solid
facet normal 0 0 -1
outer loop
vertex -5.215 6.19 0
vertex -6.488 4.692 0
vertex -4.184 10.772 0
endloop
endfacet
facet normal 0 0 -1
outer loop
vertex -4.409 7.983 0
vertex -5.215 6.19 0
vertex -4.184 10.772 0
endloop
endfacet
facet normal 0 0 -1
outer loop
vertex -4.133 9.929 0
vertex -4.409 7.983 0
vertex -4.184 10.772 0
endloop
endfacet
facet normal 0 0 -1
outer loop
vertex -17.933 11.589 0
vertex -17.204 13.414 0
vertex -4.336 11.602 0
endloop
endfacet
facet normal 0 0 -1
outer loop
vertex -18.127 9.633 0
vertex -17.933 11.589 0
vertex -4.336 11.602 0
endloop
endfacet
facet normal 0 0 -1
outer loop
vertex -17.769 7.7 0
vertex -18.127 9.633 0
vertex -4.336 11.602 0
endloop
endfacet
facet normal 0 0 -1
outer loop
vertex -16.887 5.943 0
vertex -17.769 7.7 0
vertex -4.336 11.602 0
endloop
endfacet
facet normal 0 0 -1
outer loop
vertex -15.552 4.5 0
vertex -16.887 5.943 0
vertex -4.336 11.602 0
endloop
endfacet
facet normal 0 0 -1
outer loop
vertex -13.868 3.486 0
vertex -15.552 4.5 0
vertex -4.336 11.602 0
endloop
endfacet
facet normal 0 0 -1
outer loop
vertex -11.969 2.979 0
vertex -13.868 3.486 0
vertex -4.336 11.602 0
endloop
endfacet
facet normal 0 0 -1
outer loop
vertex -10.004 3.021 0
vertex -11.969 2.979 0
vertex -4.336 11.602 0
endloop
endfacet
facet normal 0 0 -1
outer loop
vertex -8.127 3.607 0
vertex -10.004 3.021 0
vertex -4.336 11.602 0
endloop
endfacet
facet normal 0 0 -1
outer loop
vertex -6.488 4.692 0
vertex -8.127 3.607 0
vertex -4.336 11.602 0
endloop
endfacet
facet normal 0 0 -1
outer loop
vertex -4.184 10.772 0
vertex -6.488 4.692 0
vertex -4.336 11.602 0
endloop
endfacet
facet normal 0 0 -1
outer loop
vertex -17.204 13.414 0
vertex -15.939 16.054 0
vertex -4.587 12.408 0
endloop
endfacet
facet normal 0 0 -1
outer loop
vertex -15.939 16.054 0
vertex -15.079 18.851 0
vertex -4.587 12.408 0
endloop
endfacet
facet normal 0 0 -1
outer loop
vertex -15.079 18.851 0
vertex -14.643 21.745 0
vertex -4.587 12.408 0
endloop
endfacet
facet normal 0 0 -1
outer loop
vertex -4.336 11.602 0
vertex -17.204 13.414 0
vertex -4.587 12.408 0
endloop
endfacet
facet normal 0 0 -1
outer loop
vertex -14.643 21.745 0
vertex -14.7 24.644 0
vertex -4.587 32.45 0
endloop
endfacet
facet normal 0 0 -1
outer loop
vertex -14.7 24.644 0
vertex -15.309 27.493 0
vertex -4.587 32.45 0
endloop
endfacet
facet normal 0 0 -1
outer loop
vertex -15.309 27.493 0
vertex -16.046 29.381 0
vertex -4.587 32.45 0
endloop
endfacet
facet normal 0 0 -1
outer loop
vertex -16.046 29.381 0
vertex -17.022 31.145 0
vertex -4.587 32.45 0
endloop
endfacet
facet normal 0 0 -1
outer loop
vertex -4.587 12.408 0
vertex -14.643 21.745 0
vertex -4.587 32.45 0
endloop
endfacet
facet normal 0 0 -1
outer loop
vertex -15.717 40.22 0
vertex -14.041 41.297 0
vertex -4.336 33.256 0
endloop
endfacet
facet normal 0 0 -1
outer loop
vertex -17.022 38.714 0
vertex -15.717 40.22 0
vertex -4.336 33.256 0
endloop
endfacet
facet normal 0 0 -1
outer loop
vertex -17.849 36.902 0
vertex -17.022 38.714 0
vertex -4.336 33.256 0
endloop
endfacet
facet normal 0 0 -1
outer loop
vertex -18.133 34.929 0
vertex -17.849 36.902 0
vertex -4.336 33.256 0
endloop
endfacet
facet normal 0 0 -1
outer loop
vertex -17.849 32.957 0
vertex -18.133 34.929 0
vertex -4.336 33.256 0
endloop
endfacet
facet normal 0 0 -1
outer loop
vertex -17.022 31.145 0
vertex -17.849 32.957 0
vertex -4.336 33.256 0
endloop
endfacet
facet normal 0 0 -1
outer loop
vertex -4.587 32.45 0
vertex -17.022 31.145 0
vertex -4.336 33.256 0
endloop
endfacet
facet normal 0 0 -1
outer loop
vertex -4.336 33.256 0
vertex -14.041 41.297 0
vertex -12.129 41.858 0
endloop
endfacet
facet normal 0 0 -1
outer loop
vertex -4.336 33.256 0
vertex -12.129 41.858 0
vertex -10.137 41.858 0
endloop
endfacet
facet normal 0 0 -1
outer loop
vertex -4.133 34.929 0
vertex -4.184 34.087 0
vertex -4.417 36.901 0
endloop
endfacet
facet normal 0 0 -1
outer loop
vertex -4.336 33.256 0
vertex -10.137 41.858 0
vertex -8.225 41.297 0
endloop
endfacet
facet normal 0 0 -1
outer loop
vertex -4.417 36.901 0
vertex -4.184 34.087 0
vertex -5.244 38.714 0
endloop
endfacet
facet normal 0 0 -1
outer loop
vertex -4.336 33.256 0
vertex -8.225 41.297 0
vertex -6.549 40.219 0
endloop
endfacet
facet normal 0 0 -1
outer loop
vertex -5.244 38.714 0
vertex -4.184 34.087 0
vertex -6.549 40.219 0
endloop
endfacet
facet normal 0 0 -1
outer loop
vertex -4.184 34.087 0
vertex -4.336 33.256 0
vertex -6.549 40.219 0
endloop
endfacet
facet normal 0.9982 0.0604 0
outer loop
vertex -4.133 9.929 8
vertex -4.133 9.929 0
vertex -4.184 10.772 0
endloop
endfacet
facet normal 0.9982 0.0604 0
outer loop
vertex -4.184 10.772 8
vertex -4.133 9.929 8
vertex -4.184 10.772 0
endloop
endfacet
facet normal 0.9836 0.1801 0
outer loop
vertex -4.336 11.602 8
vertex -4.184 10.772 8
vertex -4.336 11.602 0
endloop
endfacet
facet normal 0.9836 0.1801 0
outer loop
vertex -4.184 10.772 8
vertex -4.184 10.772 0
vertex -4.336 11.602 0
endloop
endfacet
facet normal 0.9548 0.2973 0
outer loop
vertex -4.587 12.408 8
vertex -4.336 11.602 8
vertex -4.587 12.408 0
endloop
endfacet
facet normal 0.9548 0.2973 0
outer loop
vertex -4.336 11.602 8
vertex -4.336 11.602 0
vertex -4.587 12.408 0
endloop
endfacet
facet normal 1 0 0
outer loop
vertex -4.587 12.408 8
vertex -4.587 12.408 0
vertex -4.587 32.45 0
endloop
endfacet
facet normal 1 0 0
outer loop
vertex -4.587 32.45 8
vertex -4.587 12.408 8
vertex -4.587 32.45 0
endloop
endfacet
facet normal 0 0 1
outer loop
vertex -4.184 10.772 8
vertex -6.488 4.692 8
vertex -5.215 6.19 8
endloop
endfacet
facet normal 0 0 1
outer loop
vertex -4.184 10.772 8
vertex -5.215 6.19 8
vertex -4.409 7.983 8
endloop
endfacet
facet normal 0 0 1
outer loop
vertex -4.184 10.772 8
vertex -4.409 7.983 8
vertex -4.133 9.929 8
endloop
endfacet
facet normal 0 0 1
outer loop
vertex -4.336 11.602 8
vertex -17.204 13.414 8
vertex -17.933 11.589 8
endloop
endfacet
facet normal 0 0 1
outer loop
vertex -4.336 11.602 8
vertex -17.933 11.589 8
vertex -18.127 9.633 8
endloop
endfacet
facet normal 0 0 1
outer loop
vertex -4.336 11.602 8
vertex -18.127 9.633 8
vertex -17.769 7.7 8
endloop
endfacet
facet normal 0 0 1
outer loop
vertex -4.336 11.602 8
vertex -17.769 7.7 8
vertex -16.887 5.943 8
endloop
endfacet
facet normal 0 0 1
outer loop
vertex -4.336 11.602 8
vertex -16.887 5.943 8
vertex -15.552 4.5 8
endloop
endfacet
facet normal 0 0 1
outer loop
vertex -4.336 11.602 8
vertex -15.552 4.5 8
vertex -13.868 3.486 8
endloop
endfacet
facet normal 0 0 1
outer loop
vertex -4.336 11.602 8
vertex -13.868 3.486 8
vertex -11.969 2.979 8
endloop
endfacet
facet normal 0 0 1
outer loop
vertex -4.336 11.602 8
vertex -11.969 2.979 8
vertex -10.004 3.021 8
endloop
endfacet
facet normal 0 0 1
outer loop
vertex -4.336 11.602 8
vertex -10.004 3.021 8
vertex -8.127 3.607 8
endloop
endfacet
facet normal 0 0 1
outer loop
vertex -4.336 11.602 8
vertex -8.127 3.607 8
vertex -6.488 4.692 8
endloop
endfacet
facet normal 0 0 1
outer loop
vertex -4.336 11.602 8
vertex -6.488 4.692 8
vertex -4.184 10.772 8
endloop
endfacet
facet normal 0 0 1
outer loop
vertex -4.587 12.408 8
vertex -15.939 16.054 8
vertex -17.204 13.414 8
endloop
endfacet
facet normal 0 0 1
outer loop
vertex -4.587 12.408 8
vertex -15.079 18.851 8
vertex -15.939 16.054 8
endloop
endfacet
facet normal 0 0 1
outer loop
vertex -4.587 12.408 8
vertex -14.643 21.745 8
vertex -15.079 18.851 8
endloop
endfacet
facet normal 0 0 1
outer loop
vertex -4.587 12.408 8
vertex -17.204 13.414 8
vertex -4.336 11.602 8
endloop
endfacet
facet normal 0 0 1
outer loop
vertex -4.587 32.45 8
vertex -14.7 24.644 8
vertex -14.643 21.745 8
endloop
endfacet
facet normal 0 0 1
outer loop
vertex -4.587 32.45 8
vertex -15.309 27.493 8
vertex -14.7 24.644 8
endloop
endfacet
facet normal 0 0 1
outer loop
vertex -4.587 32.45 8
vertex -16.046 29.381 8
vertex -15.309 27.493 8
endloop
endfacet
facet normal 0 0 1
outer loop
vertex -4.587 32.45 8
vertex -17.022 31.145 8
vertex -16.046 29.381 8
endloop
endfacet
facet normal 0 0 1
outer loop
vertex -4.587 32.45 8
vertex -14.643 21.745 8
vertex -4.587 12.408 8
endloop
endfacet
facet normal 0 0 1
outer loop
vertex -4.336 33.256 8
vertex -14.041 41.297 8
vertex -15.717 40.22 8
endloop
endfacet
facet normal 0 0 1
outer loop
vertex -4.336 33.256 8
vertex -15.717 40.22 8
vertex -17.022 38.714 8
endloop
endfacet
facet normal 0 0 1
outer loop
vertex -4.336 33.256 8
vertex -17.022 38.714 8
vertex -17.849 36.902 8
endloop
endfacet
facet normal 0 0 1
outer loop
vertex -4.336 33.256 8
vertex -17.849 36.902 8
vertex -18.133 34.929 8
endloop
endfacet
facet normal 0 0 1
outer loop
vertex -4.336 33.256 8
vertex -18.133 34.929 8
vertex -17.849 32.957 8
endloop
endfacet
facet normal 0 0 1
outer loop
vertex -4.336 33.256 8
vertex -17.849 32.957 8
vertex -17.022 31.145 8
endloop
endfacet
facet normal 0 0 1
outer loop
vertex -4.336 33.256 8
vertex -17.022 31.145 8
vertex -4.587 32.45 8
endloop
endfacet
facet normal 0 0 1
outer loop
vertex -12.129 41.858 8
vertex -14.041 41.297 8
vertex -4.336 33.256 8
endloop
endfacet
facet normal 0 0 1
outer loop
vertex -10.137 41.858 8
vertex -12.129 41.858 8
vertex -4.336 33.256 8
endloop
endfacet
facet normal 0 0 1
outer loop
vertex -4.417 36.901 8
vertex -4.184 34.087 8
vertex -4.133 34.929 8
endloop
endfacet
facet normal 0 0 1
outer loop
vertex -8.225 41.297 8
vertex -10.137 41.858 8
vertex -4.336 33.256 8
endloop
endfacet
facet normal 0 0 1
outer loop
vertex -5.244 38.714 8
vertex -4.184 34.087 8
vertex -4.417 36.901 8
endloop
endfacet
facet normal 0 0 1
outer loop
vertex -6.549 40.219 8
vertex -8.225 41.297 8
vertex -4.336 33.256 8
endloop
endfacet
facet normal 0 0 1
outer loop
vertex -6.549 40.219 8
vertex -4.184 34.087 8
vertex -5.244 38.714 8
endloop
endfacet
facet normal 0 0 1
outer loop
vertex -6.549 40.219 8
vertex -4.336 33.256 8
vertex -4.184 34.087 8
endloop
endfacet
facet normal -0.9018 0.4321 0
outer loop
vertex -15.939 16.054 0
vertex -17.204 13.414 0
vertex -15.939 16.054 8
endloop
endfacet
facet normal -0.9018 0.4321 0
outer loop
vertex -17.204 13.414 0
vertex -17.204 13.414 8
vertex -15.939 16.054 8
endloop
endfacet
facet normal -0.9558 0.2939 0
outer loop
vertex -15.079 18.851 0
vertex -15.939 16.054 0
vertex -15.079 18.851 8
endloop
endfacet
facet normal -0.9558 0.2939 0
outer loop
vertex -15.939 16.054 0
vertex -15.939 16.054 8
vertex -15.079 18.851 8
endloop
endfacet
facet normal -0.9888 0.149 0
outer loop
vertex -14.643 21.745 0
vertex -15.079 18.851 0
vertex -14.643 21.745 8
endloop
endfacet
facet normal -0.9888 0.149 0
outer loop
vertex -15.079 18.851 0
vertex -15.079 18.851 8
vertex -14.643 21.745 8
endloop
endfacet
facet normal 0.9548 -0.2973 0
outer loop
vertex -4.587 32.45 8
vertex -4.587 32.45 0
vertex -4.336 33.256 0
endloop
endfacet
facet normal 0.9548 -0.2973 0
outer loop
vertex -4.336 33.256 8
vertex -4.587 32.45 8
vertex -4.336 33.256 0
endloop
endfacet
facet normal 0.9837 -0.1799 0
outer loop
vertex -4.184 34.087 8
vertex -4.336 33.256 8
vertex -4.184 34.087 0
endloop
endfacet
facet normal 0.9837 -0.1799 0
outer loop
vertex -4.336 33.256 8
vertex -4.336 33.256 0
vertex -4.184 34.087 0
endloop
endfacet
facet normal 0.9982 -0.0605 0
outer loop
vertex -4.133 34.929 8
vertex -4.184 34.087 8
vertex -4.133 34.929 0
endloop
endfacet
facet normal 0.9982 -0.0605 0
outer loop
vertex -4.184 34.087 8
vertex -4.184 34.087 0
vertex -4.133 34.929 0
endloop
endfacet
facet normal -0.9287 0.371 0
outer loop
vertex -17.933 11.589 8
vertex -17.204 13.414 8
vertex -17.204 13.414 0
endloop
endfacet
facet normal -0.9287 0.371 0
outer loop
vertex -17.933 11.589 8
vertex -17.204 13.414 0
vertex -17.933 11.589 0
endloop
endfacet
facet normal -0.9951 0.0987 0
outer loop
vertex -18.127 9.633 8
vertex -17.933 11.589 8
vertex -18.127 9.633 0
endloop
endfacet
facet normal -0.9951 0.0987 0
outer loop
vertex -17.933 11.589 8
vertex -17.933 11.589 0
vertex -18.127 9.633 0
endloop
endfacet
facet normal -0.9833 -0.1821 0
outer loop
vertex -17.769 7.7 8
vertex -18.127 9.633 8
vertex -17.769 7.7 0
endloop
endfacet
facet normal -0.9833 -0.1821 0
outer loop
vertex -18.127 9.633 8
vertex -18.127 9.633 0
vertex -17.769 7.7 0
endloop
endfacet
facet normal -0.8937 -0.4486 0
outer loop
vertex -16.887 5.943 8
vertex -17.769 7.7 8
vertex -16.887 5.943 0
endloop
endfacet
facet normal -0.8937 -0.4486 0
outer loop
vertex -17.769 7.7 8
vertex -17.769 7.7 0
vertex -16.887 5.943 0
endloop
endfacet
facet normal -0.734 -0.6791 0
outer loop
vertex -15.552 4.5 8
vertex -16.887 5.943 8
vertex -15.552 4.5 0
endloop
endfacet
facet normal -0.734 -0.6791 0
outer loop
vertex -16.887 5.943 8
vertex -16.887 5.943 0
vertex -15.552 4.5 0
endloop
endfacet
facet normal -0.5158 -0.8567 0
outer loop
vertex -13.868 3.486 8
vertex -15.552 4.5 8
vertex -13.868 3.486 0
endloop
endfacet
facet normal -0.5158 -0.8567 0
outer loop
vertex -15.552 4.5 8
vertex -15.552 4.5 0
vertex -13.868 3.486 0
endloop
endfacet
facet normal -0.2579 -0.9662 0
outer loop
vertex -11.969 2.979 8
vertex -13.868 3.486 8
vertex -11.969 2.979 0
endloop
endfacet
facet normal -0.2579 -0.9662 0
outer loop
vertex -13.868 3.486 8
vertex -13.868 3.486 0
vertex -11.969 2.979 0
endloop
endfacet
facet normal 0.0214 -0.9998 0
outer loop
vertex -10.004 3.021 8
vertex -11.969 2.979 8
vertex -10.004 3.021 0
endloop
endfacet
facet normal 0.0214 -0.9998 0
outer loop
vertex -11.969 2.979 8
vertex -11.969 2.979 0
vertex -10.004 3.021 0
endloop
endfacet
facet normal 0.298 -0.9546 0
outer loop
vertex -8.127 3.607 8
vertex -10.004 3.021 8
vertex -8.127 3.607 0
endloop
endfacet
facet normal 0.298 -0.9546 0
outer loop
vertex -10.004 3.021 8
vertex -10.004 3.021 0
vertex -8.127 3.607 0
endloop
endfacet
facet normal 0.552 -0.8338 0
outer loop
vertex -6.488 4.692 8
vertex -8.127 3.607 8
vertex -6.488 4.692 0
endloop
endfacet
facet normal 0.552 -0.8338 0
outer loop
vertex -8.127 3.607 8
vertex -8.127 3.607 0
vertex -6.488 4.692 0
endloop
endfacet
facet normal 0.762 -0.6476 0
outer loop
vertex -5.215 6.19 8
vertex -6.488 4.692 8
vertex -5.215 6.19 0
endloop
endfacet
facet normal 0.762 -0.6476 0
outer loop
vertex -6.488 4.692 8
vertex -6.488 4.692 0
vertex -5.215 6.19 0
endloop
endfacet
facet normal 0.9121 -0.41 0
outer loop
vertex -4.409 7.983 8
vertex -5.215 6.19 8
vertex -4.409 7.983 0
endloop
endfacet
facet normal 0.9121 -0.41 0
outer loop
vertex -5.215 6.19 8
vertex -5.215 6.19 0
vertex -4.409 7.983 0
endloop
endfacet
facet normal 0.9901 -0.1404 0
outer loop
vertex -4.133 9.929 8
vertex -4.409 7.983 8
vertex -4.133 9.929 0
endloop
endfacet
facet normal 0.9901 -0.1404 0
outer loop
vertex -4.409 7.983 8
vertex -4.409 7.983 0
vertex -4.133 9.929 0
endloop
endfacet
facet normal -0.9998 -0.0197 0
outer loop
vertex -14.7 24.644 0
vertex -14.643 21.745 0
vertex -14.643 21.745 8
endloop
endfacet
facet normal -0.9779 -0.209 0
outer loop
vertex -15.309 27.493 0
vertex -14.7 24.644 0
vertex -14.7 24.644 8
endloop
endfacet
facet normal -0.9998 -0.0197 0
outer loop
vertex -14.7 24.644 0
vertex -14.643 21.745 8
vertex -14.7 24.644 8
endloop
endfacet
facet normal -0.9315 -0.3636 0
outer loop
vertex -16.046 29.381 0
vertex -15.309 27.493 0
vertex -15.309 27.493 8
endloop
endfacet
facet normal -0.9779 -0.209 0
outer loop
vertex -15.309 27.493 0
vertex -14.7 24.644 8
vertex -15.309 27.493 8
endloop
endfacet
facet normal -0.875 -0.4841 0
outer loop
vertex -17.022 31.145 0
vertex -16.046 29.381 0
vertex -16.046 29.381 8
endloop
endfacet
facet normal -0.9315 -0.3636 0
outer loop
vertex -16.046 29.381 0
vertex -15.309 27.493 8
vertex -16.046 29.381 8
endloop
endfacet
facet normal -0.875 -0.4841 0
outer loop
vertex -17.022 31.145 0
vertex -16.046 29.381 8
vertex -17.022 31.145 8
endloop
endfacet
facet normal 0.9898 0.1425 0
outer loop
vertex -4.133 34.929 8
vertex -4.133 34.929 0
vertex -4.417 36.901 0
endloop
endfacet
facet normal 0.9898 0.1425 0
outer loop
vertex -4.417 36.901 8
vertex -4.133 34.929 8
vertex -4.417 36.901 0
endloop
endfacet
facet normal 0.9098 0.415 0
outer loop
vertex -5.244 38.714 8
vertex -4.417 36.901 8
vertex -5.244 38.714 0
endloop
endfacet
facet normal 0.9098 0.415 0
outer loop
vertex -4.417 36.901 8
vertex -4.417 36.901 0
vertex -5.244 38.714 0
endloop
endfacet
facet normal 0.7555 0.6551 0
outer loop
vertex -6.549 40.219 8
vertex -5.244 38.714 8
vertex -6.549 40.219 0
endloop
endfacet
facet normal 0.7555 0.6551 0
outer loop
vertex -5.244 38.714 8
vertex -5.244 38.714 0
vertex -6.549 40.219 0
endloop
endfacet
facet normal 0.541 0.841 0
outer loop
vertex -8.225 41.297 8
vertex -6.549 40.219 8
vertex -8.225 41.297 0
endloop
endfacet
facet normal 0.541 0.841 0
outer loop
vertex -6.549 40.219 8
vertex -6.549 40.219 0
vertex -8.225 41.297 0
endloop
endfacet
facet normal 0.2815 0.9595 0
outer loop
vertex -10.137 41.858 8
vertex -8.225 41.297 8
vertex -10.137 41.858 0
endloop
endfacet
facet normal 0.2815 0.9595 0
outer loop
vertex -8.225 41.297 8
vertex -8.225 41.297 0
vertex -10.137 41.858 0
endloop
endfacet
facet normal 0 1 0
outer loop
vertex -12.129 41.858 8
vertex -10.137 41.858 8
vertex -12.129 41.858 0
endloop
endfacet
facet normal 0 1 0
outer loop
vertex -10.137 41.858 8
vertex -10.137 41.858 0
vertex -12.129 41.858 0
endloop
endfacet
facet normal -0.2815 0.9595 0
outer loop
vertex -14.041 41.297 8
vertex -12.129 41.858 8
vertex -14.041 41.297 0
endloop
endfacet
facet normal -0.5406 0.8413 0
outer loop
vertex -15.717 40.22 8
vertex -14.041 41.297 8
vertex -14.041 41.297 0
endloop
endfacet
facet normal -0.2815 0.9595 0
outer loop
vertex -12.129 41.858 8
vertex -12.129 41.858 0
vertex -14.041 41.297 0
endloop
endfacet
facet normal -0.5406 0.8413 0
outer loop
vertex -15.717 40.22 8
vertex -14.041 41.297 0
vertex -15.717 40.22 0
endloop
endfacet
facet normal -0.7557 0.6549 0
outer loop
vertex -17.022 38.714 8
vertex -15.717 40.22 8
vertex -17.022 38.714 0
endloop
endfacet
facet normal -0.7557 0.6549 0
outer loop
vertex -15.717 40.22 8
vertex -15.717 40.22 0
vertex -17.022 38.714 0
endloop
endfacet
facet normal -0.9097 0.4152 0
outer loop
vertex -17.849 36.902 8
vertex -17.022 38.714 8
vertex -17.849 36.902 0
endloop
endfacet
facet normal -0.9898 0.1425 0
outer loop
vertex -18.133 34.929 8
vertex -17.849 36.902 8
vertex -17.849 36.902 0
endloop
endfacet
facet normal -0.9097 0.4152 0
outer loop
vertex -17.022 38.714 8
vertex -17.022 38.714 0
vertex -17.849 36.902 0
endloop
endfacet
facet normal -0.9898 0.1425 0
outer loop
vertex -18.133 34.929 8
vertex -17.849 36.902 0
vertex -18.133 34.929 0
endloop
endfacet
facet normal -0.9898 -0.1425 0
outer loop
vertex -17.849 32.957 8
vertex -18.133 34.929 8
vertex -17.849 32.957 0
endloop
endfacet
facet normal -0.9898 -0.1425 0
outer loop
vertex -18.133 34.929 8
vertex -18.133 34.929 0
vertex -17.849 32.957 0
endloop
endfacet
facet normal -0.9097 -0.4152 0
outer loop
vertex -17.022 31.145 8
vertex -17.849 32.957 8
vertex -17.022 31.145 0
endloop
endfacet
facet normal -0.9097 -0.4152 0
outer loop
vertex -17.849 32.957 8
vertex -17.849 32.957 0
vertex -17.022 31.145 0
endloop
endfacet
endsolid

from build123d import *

# Parameters (mm, degrees)
F0_R     = 0.75
F1_DEPTH = 8
F2_R     = 19.7132732736
F3_R     = 15.261888986


with BuildPart() as f1:
    # F0 (on Top) → F1 (new body)
    with BuildSketch(Plane.XY):
        with BuildLine():
            Line((-14.586677067, 11.8301414847), (-14.586677067, 16.0179088211))
            ThreePointArc((-14.586677067, 16.0179088211), (-14.6560408436, 3.8804388779), (-4.1329702753, 9.929238244))
            ThreePointArc((-4.1329702753, 9.929238244), (-4.2473311453, 11.189386557), (-4.586677067, 12.4083601108))
            Line((-4.586677067, 12.4083601108), (-4.586677067, 11.8301414847))
            Line((-4.586677067, 11.8301414847), (-14.586677067, 11.8301414847))
        make_face()
        with BuildLine():
            Line((-14.586677067, 32.8301414847), (-14.586677067, 28.8405676668))
            ThreePointArc((-14.586677067, 28.8405676668), (-8.7563690973, 28.3450323814), (-4.586677067, 32.4501163771))
            Line((-4.586677067, 32.4501163771), (-4.586677067, 32.8301414847))
            Line((-4.586677067, 32.8301414847), (-14.586677067, 32.8301414847))
        make_face()
        with BuildLine():
            ThreePointArc((-4.586677067, 32.4501163771), (-8.7563690973, 28.3450323814), (-14.586677067, 28.8405676668))
            Line((-14.586677067, 28.8405676668), (-14.586677067, 16.0179088211))
            ThreePointArc((-14.586677067, 16.0179088211), (-8.7563690973, 16.5134441066), (-4.586677067, 12.4083601108))
            Line((-4.586677067, 12.4083601108), (-4.586677067, 32.4501163771))
        make_face()
        with BuildLine():
            ThreePointArc((-4.586677067, 32.4501163771), (-4.2473311453, 33.6690899309), (-4.1329702753, 34.929238244))
            ThreePointArc((-4.1329702753, 34.929238244), (-14.6560408436, 40.97803761), (-14.586677067, 28.8405676668))
            Line((-14.586677067, 28.8405676668), (-14.586677067, 32.8301414847))
            Line((-14.586677067, 32.8301414847), (-4.586677067, 32.8301414847))
            Line((-4.586677067, 32.8301414847), (-4.586677067, 32.4501163771))
        make_face()
        with Locations((-11.1329702753, 34.929238244)):
            Circle(F0_R, mode=Mode.SUBTRACT)
        with BuildLine():
            ThreePointArc((-4.586677067, 12.4083601108), (-8.7563690973, 16.5134441066), (-14.586677067, 16.0179088211))
            Line((-14.586677067, 16.0179088211), (-14.586677067, 11.8301414847))
            Line((-14.586677067, 11.8301414847), (-4.586677067, 11.8301414847))
            Line((-4.586677067, 11.8301414847), (-4.586677067, 12.4083601108))
        make_face()
        with Locations((-11.1329702753, 34.929238244)):
            Circle(F0_R)
    extrude(amount=F1_DEPTH)

    # F2
    f2_edges = [f1.edges().sort_by_distance(p)[0] for p in [
        (-14.586677, 16.017909, 4),
    ]]
    fillet(f2_edges, radius=F2_R)

    # F3
    f3_edges = [f1.edges().sort_by_distance(p)[0] for p in [
        (-14.586677, 28.840568, 4),
    ]]
    fillet(f3_edges, radius=F3_R)


solid = f1.part
